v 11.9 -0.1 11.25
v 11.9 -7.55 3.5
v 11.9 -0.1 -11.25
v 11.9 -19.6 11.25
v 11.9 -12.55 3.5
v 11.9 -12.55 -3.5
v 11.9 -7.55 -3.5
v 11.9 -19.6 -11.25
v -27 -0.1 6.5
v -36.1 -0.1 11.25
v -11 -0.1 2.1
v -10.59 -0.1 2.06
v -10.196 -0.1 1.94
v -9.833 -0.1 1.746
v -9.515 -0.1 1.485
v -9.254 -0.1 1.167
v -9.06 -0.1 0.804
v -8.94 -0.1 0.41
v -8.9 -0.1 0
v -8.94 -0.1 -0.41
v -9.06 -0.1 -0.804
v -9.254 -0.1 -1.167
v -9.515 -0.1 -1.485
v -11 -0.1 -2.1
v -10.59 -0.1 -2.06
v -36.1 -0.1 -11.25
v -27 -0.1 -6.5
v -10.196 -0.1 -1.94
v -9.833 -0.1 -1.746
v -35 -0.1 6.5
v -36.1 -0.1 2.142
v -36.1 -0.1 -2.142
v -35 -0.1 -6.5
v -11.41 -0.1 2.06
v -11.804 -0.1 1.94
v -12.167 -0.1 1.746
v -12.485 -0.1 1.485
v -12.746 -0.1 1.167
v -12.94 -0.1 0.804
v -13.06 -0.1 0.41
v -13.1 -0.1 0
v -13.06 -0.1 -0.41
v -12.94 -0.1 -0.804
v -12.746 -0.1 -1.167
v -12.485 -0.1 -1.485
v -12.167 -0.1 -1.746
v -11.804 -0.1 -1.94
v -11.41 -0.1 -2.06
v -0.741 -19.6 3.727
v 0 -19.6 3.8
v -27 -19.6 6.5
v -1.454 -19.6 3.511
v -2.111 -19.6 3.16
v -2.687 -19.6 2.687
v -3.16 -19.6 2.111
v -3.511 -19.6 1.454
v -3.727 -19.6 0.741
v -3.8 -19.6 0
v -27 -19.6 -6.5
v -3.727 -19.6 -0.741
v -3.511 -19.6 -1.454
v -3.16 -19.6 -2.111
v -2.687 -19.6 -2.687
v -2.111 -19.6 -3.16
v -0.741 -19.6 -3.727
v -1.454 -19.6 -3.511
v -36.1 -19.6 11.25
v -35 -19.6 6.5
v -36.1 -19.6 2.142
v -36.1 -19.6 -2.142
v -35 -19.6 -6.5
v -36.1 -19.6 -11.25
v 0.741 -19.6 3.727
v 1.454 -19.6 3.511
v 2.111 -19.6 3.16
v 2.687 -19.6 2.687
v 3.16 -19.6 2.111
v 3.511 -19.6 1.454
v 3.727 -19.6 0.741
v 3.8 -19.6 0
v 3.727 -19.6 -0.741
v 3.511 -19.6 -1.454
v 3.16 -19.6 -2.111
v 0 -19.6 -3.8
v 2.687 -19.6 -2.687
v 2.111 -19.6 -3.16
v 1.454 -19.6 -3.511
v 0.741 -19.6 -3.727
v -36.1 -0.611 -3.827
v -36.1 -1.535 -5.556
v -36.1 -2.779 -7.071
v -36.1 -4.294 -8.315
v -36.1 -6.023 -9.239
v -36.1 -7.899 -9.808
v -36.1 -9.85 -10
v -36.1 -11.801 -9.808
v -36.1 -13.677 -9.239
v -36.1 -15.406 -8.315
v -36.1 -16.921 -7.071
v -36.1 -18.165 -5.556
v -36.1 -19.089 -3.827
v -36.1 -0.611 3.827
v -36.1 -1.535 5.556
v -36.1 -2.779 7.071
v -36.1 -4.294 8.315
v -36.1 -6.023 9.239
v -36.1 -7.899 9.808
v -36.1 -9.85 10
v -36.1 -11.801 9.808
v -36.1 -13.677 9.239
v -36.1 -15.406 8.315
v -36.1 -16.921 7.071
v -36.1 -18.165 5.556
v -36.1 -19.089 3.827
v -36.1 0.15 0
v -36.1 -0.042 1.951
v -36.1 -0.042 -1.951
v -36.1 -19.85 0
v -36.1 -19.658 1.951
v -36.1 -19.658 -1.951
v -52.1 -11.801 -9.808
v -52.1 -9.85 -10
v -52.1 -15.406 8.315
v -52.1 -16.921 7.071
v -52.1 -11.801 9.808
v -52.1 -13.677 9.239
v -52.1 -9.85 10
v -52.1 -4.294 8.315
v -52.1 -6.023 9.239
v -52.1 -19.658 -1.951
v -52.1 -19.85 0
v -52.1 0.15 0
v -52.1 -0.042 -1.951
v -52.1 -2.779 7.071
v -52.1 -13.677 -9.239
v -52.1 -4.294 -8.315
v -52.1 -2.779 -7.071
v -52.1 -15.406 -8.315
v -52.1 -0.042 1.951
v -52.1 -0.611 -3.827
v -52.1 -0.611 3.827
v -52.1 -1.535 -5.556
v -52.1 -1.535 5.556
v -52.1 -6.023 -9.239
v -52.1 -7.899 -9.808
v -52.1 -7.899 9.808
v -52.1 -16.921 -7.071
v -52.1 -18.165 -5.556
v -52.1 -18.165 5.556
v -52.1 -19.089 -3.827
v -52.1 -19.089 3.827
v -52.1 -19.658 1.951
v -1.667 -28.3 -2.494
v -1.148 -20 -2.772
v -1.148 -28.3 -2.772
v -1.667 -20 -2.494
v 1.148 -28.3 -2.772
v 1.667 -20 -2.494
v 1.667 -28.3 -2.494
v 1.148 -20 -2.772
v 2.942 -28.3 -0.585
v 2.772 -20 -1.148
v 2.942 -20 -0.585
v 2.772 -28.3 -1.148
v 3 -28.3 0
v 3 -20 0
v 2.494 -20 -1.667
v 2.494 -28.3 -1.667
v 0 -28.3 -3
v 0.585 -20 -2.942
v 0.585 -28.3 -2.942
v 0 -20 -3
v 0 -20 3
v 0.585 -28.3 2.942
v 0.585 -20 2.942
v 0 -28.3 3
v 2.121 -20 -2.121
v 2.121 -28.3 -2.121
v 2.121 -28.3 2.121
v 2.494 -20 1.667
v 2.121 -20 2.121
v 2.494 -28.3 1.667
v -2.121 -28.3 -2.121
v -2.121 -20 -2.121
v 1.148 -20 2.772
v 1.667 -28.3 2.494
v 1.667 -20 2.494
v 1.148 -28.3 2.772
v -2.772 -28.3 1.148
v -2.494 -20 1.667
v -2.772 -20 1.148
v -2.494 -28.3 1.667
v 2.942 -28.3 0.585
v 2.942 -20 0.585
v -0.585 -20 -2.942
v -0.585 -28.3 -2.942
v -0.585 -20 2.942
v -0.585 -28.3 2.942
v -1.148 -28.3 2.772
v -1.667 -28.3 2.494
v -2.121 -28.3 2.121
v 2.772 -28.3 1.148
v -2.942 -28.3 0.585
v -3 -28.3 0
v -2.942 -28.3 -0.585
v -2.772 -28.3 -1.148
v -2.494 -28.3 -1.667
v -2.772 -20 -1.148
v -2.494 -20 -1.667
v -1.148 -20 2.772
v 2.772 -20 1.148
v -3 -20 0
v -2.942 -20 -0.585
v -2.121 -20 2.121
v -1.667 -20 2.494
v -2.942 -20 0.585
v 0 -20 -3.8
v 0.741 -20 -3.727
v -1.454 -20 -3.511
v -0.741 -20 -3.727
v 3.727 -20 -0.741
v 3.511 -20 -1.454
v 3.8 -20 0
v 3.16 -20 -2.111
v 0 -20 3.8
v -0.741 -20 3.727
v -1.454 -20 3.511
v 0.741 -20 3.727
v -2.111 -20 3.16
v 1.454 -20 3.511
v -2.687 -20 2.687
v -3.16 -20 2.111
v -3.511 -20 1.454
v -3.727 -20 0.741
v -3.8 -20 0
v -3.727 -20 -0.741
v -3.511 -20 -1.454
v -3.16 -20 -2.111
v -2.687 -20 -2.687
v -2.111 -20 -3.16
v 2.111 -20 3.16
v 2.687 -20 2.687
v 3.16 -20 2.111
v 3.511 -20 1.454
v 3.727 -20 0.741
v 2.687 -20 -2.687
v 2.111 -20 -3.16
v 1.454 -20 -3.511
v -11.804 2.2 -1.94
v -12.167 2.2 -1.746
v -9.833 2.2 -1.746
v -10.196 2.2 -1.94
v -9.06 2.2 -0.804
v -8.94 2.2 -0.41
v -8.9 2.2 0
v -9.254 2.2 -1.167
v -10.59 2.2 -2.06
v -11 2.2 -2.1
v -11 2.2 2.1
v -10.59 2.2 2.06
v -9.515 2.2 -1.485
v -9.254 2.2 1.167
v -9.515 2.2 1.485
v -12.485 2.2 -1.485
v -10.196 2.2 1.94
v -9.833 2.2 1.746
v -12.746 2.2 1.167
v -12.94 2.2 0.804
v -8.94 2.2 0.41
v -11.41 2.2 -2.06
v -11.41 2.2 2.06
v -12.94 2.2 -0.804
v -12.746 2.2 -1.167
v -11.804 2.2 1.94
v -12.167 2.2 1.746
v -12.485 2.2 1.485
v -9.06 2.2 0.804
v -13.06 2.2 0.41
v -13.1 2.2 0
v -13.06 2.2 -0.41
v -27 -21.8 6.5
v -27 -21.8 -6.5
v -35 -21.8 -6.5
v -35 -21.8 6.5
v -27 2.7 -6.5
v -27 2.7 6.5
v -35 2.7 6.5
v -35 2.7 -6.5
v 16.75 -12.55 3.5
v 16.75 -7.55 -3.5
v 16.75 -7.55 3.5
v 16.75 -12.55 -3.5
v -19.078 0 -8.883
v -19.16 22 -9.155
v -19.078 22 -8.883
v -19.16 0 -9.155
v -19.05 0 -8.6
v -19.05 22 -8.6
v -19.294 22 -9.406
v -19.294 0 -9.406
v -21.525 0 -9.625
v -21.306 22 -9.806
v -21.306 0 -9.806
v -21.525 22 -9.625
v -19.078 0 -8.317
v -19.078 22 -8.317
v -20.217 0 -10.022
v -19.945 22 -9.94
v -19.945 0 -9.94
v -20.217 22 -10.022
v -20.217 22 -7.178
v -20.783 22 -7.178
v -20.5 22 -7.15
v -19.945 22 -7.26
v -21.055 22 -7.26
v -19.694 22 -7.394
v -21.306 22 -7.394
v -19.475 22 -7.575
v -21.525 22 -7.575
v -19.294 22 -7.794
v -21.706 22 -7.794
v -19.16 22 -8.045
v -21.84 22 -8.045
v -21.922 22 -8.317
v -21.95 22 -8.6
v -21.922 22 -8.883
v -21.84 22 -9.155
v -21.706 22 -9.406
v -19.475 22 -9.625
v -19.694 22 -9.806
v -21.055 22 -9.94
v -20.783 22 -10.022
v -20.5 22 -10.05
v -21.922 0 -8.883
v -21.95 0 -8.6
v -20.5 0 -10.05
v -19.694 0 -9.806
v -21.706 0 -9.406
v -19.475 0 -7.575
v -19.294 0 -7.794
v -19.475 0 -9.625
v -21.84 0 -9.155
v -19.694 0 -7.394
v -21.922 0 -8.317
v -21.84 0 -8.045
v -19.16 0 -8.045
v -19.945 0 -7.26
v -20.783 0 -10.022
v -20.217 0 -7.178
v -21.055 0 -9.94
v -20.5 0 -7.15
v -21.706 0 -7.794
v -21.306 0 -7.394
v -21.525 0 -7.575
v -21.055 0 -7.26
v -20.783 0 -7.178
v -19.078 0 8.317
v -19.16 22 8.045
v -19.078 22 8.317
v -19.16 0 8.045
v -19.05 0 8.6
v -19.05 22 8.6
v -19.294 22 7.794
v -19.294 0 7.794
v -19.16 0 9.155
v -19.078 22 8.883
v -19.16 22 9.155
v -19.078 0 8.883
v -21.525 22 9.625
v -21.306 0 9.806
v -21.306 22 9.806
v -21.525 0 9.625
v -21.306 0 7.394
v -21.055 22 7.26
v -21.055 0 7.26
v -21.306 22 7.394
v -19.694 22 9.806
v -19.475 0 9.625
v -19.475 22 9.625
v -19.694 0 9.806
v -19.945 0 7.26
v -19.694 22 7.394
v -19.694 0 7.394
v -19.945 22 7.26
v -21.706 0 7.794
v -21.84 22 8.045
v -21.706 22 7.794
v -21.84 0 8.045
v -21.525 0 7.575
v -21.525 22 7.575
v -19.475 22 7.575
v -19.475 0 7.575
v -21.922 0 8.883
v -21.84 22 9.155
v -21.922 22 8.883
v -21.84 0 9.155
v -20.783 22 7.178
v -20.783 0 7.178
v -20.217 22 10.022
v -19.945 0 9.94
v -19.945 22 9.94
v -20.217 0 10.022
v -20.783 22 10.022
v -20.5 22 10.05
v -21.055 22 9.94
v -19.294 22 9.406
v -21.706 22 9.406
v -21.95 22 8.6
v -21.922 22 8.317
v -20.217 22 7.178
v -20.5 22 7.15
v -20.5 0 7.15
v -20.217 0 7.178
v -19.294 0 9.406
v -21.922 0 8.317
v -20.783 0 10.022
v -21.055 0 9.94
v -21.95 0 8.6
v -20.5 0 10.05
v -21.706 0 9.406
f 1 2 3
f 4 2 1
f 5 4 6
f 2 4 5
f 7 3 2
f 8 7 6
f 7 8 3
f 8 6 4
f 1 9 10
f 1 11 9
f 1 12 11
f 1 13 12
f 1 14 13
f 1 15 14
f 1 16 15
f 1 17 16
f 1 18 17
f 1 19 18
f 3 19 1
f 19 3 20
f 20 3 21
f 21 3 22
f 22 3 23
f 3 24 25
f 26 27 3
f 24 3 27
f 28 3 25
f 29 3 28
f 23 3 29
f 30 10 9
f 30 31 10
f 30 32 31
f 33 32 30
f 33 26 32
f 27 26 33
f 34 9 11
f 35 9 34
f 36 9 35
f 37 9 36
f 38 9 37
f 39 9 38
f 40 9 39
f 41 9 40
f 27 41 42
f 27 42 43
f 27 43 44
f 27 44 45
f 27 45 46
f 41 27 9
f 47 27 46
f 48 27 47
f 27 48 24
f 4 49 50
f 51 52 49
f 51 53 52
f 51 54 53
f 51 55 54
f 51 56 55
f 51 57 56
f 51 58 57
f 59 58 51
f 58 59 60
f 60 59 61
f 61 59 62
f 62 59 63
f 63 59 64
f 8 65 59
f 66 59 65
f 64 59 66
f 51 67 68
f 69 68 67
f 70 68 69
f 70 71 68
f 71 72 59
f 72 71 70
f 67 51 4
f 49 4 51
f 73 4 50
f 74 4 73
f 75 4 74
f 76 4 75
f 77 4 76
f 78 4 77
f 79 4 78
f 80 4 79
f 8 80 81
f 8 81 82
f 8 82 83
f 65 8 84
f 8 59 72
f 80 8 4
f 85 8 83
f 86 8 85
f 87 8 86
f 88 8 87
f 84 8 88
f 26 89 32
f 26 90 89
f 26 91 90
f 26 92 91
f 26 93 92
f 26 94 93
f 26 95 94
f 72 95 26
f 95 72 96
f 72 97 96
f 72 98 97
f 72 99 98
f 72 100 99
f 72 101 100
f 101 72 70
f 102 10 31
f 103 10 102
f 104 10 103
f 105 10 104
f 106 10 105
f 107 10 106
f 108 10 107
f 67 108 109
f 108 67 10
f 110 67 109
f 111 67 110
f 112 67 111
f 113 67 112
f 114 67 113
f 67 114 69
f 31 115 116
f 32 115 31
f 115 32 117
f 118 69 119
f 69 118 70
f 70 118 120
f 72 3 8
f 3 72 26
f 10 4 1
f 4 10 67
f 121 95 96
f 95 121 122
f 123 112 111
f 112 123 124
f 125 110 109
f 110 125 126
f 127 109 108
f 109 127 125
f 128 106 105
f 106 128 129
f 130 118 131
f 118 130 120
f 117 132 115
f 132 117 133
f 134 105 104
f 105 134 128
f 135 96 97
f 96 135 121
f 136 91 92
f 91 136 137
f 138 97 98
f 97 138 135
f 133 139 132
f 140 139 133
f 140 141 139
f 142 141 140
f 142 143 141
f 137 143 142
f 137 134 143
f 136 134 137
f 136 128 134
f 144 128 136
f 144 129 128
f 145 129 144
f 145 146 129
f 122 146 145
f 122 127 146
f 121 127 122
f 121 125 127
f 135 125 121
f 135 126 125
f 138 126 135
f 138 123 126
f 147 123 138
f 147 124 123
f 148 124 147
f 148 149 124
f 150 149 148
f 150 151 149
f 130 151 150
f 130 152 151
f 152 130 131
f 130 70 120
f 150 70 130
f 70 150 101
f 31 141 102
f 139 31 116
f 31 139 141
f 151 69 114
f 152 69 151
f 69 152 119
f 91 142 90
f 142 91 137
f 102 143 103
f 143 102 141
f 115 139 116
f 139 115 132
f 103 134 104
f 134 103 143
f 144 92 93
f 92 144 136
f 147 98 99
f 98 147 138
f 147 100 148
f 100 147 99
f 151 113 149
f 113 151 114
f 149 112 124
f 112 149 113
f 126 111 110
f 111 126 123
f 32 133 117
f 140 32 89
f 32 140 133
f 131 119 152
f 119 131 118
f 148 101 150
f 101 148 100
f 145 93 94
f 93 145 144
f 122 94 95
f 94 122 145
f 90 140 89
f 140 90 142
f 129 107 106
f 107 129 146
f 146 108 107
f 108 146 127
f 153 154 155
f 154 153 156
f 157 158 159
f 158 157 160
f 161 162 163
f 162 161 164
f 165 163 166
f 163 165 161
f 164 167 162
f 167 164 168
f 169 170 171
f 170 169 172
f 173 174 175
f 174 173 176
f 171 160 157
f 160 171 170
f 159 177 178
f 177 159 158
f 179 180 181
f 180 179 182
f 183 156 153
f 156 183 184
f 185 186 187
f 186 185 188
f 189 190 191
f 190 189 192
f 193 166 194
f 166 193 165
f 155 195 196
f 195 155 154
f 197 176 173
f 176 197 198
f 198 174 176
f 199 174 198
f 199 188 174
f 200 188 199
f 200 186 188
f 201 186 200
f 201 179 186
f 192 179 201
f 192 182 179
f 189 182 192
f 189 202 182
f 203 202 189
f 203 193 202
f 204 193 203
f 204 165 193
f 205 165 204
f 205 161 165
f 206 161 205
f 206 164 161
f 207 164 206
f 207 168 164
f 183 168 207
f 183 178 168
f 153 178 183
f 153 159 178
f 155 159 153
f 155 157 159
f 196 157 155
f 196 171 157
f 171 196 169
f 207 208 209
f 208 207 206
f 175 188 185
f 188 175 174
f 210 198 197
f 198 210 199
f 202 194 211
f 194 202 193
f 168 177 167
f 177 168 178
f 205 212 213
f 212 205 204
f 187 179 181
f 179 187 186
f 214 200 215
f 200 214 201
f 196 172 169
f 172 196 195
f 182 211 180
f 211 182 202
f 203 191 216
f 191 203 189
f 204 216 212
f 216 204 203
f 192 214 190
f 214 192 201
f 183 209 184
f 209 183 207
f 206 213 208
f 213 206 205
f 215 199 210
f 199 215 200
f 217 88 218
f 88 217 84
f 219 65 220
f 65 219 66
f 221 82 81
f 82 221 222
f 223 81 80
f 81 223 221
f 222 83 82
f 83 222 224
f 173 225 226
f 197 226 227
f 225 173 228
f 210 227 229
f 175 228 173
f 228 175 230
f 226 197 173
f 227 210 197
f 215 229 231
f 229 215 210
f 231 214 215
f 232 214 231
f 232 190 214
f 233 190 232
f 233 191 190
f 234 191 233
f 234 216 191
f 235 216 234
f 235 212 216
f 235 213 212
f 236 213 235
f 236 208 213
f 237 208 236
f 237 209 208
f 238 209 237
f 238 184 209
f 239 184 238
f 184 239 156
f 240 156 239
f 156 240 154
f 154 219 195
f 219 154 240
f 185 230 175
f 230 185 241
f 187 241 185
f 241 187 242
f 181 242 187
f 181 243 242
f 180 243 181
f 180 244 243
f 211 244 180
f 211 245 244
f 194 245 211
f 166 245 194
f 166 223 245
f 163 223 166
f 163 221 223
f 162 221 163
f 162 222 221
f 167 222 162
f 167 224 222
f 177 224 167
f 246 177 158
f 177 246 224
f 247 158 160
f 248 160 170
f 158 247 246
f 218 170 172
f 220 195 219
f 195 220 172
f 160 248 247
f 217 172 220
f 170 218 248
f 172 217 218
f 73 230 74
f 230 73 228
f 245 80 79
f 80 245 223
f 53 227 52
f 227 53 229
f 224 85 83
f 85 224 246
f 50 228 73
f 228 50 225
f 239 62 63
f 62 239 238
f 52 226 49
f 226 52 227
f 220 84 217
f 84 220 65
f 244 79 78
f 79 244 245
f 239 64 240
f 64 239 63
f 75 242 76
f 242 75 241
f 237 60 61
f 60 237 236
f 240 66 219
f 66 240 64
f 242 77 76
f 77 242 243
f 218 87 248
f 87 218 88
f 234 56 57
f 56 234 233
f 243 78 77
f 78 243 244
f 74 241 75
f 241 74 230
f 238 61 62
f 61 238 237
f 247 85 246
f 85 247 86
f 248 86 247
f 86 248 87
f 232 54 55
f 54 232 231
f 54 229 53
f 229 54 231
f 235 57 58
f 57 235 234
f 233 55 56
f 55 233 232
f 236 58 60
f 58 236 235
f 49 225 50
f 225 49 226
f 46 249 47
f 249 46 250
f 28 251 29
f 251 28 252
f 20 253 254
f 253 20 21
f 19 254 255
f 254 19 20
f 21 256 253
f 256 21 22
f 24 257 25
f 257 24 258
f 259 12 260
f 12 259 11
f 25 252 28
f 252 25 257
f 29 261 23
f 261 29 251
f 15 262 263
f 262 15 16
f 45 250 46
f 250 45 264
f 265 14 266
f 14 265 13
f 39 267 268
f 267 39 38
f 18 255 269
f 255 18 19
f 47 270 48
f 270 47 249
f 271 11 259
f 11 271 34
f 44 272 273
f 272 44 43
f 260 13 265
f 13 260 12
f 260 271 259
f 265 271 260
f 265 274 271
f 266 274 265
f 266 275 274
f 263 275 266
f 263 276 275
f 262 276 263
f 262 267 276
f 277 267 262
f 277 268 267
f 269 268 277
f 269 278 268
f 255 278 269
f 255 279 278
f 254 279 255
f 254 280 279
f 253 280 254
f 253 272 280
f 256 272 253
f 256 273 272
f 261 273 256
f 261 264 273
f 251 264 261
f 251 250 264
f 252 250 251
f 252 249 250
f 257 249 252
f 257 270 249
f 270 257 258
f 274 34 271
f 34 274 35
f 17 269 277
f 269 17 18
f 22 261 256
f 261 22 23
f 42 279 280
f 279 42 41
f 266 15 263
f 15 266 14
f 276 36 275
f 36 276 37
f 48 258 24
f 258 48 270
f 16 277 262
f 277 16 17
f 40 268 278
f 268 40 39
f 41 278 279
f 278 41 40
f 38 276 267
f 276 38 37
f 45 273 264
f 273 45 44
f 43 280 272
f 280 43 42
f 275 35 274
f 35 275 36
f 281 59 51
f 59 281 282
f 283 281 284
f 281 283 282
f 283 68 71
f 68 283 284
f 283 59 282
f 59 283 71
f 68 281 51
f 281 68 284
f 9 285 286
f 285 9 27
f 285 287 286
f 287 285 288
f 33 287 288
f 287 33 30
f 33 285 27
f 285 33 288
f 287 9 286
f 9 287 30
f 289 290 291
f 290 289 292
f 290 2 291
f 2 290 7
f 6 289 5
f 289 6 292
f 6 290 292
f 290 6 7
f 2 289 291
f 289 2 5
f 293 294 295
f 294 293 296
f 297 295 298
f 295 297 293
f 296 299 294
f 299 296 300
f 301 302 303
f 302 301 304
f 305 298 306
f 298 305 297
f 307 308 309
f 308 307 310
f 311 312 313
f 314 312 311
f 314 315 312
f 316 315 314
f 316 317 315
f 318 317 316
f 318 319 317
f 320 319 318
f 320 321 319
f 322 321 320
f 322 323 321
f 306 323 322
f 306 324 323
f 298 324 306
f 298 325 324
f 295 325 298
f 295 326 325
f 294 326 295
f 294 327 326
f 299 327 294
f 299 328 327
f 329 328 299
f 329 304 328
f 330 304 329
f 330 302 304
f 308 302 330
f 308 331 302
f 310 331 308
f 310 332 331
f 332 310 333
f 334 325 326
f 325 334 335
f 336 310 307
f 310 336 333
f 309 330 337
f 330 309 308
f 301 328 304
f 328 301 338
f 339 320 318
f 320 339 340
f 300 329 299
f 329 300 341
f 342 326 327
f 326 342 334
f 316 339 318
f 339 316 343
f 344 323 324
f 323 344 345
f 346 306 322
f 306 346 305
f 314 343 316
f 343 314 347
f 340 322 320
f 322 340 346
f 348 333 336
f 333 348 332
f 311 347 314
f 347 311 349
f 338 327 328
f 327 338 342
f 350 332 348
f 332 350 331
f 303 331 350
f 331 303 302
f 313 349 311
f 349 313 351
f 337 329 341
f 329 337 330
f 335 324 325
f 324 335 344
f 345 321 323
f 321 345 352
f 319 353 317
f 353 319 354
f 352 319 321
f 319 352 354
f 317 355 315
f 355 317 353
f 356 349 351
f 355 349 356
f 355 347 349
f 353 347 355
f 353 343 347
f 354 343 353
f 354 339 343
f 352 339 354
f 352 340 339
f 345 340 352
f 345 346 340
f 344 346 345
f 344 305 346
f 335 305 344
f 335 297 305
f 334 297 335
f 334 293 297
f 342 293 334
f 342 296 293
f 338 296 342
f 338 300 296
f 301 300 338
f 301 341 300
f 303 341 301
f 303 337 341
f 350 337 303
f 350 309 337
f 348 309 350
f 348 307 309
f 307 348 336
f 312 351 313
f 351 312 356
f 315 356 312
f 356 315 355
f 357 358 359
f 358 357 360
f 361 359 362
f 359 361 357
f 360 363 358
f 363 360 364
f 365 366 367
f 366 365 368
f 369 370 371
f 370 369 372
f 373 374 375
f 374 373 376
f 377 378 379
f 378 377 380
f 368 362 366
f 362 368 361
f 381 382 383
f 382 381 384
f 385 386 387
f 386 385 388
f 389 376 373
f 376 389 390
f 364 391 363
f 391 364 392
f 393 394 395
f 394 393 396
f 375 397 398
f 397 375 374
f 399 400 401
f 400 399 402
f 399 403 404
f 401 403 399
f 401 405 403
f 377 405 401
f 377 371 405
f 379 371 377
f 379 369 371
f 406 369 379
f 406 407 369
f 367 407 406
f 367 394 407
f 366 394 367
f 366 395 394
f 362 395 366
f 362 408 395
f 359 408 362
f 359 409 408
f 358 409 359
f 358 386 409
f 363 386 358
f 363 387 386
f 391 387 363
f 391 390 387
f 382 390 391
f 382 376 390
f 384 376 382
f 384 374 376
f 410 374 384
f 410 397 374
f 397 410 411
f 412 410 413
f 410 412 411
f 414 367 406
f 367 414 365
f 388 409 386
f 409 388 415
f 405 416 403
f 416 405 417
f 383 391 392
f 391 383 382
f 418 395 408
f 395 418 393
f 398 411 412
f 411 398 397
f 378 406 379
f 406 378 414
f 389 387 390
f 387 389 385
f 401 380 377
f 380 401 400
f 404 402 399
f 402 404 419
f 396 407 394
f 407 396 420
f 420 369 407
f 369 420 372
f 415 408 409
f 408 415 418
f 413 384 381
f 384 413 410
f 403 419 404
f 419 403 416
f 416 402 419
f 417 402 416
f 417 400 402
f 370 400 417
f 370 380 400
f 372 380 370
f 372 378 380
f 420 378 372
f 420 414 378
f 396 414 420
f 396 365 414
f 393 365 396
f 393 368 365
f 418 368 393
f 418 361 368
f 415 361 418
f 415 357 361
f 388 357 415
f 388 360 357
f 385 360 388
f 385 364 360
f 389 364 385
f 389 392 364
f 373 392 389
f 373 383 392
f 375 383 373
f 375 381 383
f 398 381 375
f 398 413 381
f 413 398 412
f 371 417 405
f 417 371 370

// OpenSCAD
// copied from: https://www.thingiverse.com/thing:2832714/files
// and then modified...

module at_tt_motor_mount_holes() {
rotate(-90,[1,0,0])
//    translate([0,0,-8.3]) 
  for(p=[(20.2-3)/2,-(20.2-3)/2])
    translate([-20.5,p,0])
        children();

}

function ttMotorH() = 22.5;
function ttMotorW() = 19;
function ttMotorHoleO() = -20.5;
function ttMotorNippleO() = -11;

module tt_motor_scad(backmount=true){
   $fn=32;
    off=backmount?20:0;
 
  color([0,1,0])
rotate(-90,[1,0,0])
    translate([0,0,-8.3-off]) {
  //#tt_motor();
  translate([-48/2+11.9,0,8.7+(18.5+1)/2]) {
     cube([48,22.5,18.5+1],center=true);
      MH=16;
    translate([-48/2-MH/2,0,0]) 
      rotate(90,[0,1,0])
      cylinder(h=MH,d=20,center=true);
  }
//     Cube636(48,22.5,18.5+1,r=1.3,rz=2);
    
  cylinder(d=6,h=11);
  translate([0,0,8.3])
     cylinder(d=7.6,h=11);
    
  // nipple
  
  translate([-11,0,6.5+off])
     cylinder(d=4.2,h=4);
    
  translate([-31,0,6.5])
    translate([0,0,2])
     cube([8,13,4],center=true);
  translate([-31,0,6.5+18.5+2])
    translate([0,0,2])
     cube([8,13,4],center=true);
    
  translate([14,0,6.5+18.5/2])
    translate([0,0,5/2])
     cube([5.5,7,5],center=true);  
   
}
  //mounthole
  at_tt_motor_mount_holes() 
    cylinder(d=2.9,h=22);  
}

tt_motor_scad();
